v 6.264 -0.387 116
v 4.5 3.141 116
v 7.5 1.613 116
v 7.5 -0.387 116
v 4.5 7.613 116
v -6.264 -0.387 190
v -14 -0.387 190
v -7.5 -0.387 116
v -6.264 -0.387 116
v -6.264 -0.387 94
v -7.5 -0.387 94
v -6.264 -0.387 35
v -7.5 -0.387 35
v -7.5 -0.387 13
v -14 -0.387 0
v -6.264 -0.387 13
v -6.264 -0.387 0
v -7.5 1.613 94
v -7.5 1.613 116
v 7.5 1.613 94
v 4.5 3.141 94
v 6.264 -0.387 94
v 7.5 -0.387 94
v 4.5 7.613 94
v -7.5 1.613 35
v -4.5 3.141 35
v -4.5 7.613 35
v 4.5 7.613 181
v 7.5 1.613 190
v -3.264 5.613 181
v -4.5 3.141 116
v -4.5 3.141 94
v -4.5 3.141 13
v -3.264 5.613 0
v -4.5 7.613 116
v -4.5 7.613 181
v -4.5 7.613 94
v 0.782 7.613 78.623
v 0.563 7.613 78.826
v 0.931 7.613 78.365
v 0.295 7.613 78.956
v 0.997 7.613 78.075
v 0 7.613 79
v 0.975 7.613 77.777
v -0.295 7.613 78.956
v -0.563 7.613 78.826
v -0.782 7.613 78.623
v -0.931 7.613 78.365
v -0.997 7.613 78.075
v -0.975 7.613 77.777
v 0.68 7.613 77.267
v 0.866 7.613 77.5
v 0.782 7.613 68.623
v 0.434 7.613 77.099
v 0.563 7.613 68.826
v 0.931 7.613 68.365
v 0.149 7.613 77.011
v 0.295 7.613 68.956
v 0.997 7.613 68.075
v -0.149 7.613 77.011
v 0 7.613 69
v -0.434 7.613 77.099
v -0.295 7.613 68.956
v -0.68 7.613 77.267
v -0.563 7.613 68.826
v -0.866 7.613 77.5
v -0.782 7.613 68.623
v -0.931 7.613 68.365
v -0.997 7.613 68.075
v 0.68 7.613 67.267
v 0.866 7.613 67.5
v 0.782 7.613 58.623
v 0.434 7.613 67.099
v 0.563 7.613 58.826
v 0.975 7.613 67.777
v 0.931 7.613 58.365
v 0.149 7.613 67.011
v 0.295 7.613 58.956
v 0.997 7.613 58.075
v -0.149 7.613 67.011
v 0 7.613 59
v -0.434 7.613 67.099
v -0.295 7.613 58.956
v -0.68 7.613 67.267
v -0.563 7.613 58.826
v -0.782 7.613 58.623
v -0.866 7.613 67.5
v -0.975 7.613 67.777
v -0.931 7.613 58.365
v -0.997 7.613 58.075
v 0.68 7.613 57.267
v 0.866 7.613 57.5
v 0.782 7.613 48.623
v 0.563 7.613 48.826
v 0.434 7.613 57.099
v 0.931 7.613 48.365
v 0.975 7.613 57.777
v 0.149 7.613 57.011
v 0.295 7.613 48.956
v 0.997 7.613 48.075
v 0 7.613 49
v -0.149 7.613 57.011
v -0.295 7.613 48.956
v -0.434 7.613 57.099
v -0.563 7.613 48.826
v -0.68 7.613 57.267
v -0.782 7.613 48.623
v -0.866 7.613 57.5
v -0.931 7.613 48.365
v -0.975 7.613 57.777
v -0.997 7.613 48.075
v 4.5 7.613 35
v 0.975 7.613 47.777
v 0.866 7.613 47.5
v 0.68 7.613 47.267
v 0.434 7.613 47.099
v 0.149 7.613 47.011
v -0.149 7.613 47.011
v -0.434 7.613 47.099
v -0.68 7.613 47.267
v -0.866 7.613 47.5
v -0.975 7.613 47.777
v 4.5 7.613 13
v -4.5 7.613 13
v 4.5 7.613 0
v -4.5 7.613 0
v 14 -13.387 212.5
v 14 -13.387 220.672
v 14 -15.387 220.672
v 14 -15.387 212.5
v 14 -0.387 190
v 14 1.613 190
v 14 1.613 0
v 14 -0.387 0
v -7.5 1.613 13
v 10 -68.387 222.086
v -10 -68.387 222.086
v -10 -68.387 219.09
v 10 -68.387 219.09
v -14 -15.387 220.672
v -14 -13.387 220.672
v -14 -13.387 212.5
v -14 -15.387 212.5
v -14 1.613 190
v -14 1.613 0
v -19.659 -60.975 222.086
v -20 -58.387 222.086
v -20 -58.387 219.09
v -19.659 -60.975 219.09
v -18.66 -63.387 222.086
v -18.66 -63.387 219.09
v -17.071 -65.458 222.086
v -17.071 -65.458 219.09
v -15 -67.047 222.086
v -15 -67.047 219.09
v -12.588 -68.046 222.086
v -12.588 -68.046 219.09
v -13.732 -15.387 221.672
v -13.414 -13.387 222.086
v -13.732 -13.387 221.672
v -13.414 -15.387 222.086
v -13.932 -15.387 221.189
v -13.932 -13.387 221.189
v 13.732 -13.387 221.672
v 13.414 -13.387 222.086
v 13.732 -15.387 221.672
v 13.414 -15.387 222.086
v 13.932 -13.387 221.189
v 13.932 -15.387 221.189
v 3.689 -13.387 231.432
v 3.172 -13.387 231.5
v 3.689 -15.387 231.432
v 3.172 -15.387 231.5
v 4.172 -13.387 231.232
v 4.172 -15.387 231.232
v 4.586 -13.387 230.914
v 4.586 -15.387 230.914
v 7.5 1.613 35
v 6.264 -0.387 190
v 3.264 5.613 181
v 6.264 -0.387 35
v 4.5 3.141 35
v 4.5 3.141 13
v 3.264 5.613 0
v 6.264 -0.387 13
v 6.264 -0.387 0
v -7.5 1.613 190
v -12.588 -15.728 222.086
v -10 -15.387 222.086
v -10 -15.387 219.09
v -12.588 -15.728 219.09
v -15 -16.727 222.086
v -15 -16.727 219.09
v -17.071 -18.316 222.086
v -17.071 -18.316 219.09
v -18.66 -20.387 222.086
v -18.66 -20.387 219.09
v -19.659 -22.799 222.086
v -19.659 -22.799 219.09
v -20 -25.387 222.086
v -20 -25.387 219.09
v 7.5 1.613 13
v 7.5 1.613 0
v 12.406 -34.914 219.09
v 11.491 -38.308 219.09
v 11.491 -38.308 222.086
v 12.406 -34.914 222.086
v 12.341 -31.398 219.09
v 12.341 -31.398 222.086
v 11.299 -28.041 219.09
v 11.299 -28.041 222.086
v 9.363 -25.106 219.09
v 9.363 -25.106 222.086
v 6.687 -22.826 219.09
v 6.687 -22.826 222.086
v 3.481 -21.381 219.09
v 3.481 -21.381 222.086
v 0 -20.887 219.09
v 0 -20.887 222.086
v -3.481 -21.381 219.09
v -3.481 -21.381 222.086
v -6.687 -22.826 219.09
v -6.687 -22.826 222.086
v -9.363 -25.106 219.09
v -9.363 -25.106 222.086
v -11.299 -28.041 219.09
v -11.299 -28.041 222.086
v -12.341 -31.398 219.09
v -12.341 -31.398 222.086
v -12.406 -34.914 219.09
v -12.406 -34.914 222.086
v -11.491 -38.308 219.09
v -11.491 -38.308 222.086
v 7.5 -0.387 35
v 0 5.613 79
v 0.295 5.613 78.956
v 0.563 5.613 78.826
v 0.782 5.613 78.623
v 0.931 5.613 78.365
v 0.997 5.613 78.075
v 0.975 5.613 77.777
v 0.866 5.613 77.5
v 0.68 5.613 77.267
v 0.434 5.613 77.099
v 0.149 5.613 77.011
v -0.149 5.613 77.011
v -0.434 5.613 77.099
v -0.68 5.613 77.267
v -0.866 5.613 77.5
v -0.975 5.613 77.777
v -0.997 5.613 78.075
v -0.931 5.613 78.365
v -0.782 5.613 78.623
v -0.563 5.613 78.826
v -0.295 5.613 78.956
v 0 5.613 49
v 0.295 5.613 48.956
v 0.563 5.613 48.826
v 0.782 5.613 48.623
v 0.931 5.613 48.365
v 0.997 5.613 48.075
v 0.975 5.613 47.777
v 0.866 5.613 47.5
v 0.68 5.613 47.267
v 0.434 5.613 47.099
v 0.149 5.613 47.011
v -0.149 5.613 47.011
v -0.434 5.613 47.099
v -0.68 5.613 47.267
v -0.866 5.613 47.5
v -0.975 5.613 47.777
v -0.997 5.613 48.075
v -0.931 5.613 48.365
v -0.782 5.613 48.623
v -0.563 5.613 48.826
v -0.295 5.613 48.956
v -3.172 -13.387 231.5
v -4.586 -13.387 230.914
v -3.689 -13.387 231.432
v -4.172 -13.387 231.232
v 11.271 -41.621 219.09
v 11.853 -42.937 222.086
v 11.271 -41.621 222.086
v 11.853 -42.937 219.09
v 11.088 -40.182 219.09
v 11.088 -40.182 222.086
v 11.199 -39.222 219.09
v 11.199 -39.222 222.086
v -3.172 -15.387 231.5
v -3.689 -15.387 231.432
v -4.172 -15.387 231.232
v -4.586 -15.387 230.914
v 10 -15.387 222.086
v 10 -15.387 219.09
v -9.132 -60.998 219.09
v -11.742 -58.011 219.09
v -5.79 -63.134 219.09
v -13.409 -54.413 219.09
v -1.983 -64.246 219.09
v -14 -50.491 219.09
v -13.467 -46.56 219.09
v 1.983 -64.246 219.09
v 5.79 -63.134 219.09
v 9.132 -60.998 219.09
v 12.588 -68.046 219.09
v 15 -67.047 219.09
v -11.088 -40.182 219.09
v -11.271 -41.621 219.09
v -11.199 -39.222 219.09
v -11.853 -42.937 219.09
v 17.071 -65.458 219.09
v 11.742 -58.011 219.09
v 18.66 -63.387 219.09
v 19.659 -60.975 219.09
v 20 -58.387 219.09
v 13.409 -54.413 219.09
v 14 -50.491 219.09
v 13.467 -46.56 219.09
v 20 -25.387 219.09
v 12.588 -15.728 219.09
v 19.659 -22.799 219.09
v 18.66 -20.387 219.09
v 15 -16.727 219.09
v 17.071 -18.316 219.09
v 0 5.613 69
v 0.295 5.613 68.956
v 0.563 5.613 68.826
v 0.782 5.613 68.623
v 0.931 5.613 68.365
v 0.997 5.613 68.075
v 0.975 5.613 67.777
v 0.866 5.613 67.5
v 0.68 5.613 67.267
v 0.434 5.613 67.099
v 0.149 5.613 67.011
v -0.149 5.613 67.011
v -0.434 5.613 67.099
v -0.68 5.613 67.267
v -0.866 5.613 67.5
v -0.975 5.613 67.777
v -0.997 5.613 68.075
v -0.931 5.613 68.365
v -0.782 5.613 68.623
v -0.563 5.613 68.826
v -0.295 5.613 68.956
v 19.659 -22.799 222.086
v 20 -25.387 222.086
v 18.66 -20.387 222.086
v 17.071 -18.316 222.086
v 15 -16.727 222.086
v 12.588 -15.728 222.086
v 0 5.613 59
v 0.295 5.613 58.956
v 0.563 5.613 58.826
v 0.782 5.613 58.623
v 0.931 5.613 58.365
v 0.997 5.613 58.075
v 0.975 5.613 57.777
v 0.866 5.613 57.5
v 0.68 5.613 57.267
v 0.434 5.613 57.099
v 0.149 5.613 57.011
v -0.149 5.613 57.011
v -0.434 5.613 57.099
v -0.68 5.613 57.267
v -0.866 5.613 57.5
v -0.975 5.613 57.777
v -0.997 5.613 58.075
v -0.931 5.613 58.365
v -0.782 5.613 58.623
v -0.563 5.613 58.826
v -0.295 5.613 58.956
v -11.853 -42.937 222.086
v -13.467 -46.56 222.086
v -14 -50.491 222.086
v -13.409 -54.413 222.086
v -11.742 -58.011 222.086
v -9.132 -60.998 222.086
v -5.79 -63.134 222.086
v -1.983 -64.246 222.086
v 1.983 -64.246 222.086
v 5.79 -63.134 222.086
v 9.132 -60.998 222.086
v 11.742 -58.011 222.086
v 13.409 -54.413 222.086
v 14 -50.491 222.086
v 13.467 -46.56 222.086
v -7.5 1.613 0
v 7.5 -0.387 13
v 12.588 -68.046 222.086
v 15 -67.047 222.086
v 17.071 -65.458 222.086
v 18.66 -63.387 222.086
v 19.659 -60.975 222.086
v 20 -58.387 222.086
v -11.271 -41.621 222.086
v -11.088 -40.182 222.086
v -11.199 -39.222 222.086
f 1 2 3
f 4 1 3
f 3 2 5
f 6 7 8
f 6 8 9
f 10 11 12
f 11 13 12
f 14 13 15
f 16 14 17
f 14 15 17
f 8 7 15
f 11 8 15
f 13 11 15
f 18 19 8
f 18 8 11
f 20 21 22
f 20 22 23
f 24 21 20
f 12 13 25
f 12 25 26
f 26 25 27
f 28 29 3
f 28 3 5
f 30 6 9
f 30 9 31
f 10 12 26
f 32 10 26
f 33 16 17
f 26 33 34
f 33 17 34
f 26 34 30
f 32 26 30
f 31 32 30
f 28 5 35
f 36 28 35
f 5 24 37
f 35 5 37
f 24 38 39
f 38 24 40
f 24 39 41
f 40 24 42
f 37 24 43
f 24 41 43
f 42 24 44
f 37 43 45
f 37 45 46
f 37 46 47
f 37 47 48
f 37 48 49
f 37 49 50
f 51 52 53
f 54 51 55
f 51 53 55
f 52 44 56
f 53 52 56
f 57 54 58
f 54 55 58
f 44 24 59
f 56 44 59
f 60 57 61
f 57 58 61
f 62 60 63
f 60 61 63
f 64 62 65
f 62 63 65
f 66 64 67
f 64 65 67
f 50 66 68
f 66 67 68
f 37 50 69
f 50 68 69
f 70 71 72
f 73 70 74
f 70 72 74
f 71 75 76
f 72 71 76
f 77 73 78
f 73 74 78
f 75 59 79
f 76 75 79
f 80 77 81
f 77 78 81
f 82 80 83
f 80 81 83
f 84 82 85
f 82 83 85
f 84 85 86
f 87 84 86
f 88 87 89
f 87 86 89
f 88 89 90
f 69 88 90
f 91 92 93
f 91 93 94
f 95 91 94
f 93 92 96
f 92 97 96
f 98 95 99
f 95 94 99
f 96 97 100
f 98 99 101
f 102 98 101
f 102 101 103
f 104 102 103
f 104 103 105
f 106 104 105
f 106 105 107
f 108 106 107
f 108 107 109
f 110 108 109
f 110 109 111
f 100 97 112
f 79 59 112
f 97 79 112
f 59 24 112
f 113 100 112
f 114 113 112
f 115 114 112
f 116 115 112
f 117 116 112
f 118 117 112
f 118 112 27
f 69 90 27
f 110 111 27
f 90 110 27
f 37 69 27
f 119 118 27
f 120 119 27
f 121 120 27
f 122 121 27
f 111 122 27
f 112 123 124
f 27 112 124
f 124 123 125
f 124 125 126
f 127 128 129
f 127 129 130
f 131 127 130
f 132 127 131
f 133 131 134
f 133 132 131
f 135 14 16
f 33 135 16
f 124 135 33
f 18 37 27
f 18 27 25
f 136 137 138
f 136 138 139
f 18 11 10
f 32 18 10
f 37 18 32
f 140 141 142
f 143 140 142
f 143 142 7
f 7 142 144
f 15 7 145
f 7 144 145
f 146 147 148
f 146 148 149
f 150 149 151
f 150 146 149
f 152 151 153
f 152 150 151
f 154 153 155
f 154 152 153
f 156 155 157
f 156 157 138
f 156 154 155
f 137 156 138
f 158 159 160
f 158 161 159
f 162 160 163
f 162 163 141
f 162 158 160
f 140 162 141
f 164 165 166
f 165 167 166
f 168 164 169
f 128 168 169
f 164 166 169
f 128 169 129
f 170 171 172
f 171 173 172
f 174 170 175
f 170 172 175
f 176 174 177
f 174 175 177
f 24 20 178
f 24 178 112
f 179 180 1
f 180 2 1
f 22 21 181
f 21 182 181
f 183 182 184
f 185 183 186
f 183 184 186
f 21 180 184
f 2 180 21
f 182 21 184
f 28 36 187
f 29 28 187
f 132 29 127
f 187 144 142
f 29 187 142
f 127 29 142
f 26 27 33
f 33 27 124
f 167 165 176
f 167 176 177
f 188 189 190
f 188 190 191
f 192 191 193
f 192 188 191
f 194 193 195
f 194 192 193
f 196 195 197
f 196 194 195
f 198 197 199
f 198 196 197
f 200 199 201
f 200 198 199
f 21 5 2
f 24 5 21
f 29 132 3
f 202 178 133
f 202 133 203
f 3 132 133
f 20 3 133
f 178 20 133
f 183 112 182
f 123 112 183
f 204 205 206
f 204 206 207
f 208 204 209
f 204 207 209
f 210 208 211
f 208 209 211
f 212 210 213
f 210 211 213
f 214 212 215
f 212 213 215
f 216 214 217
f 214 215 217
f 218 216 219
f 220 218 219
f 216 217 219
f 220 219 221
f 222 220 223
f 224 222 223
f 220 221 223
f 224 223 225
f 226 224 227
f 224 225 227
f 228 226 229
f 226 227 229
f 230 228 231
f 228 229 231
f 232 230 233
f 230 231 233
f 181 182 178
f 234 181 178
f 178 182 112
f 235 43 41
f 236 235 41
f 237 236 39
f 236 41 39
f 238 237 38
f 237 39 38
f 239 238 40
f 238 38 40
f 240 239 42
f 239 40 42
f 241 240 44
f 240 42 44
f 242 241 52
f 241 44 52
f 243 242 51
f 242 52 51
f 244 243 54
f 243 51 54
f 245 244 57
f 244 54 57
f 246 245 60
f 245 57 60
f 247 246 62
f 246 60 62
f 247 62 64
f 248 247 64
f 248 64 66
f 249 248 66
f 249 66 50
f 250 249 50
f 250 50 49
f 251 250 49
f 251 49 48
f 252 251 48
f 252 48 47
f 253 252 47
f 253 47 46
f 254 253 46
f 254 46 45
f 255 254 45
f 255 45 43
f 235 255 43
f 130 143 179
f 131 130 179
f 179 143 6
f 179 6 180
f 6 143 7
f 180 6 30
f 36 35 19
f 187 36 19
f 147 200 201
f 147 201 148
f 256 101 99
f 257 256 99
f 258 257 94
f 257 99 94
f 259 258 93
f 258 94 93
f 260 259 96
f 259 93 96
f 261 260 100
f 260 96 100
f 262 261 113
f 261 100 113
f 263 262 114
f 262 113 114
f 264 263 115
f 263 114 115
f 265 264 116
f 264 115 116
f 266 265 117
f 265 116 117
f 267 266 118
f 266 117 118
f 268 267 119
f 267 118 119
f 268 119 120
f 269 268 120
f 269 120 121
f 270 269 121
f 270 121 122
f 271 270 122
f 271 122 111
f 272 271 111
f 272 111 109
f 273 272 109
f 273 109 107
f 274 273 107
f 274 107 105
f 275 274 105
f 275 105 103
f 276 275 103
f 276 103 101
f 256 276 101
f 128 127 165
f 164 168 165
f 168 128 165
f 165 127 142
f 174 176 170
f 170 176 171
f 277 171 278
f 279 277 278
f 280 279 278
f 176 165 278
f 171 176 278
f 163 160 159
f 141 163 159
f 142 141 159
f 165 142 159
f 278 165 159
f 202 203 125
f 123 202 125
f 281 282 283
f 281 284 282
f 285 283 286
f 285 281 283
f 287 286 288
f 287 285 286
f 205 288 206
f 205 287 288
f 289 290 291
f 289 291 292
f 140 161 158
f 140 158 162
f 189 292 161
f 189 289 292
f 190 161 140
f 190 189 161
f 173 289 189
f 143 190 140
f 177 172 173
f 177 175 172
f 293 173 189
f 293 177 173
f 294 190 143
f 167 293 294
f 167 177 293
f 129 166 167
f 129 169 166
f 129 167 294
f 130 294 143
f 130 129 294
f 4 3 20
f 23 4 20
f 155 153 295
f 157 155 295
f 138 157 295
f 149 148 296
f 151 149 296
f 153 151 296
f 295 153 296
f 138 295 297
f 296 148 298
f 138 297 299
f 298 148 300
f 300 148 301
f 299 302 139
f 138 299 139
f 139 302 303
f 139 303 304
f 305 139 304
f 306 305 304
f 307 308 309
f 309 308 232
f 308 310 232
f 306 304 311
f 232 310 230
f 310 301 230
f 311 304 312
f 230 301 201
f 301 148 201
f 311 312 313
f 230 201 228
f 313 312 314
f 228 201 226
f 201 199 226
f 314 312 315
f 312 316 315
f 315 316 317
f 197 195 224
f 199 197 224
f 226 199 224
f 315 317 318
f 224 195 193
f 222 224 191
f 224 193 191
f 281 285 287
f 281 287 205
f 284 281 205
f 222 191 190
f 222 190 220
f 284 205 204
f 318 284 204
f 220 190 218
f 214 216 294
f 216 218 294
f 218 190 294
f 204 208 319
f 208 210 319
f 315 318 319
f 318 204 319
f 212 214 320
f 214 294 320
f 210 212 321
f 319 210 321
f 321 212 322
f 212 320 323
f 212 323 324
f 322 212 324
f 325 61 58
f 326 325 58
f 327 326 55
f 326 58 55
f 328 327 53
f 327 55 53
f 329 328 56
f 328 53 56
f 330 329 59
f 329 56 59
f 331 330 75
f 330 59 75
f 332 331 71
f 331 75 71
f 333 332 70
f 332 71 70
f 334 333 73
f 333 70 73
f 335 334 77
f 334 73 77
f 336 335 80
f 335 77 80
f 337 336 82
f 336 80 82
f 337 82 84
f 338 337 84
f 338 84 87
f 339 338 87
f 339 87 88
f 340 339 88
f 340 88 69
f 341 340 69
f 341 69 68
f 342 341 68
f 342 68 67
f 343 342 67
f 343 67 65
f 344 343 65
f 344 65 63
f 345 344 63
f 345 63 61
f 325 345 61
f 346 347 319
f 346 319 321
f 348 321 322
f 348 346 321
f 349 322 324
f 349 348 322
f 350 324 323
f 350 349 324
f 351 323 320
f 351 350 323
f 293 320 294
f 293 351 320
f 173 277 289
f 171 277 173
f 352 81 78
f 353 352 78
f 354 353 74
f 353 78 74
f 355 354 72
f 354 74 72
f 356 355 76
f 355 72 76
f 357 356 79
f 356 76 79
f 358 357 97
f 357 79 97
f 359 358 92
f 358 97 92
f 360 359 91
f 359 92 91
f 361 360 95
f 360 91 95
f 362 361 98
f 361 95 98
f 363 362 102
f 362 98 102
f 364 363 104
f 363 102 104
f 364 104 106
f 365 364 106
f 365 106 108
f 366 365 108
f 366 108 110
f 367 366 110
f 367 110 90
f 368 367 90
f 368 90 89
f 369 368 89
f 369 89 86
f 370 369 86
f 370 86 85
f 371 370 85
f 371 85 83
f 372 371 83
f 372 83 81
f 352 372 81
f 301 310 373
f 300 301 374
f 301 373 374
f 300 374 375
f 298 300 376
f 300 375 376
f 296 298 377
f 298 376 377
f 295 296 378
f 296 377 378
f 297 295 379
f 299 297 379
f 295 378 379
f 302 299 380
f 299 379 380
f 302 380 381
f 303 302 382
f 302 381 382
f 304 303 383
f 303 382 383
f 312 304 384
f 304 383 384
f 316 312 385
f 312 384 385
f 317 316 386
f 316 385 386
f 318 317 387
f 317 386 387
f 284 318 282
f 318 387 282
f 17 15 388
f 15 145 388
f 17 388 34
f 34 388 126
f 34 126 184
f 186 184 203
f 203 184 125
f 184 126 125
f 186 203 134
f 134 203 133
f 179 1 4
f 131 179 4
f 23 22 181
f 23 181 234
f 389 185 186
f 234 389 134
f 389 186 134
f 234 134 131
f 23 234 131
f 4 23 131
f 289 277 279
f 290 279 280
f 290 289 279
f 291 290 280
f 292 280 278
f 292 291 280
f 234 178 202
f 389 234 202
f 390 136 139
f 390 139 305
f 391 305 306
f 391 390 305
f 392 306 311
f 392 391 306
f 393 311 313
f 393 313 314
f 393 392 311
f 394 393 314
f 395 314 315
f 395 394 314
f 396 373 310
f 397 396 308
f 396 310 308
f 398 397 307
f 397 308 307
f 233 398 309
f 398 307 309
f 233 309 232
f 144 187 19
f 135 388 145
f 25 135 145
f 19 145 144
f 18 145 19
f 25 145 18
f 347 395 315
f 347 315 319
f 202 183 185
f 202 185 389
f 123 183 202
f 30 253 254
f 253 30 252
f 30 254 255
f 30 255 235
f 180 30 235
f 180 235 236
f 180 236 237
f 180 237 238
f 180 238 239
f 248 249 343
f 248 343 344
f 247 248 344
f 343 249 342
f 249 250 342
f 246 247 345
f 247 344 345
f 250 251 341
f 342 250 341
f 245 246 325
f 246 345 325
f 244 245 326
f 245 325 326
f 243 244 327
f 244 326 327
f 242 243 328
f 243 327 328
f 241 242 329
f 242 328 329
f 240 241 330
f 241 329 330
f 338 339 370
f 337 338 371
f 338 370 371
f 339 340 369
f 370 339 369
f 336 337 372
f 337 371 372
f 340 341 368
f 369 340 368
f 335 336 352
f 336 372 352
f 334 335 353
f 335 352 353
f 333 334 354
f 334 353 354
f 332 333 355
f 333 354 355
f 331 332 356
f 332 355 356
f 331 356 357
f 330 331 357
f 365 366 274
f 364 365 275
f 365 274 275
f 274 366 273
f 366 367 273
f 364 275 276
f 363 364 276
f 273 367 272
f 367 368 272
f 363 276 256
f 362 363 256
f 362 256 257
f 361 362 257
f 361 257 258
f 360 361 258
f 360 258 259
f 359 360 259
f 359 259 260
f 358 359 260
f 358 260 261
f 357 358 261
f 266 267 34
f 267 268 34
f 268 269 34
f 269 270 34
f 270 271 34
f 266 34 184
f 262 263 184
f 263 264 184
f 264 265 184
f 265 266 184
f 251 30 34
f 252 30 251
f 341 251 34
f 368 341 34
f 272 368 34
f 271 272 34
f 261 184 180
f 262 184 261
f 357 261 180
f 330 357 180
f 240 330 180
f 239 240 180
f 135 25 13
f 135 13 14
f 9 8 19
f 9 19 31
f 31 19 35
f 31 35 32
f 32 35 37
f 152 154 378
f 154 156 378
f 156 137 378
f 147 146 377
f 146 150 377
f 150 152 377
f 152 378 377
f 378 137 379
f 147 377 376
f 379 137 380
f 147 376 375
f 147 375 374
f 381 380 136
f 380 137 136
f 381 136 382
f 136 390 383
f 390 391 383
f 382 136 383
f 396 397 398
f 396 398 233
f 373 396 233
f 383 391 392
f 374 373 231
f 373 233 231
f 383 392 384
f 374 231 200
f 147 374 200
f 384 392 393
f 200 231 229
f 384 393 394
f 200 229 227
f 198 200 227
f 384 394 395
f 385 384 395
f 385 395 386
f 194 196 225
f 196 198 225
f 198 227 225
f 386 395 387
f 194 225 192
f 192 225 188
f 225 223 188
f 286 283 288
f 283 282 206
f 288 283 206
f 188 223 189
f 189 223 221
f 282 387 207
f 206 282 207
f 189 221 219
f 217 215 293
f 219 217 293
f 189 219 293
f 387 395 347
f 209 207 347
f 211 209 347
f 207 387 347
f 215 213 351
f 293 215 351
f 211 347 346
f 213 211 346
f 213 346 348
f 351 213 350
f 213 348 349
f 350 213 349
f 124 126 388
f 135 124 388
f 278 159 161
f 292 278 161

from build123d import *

# Parameters (mm, degrees)
BOSS_EXTRUDE1_DEPTH      = 190
SKETCH3_R                = 1
CUT_EXTRUDE1_DEPTH       = 191.682982985
SKETCH4_W                = 3.000241119
SKETCH4_H                = 22
CUT_EXTRUDE2_DEPTH       = 191.682982985
BOSS_EXTRUDE2_DEPTH      = 14
BOSS_EXTRUDE2_DEPTH_BACK = 14
CHAMFER1_SIZE            = 10
FILLET1_R                = 2
BOSS_EXTRUDE3_DEPTH      = 12.41
SKETCH8_W                = 9.414213562
SKETCH8_H                = 53
CUT_EXTRUDE3_DEPTH       = 245.681494555
CUT_EXTRUDE4_DEPTH       = 244.772504146
CUT_EXTRUDE5_DEPTH       = 243.216914722
FILLET2_R                = 5


with BuildPart() as part:
    # Sketch2 → Boss-Extrude1 (new body)
    with BuildSketch(Plane.XY):
        Polygon((-14, -0.387014685), (-6.26397645, -0.387014685), (-3.263735331, 5.612985315), (3.263735331, 5.612985315), (6.26397645, -0.387014685), (14, -0.387014685), (14, 1.612985315), (7.5, 1.612985315), (4.499758881, 7.612985315), (-4.499758881, 7.612985315), (-7.5, 1.612985315), (-14, 1.612985315), align=None)
    extrude(amount=BOSS_EXTRUDE1_DEPTH)

    # Sketch3 → Cut-Extrude1 (cut, through all)
    with BuildSketch(Plane(origin=(0, 7.612985315, 0), x_dir=(1, 0, 0), z_dir=(0, 1, 0))):
        with Locations(Location((0, -48, 0), (0, 0, 270))):
            Circle(SKETCH3_R)
        with Locations(Location((0, -58, 0), (0, 0, 270))):
            Circle(SKETCH3_R)
        with Locations(Location((0, -68, 0), (0, 0, 270))):
            Circle(SKETCH3_R)
        with Locations(Location((0, -78, 0), (0, 0, 270))):
            Circle(SKETCH3_R)
    extrude(amount=-CUT_EXTRUDE1_DEPTH, mode=Mode.SUBTRACT)

    # Sketch4 → Cut-Extrude2 (cut, through all)
    with BuildSketch(Plane(origin=(0, 7.612985315, 0), x_dir=(1, 0, 0), z_dir=(0, 1, 0))):
        with Locations((-5.999879441, -24)):
            Rectangle(SKETCH4_W, SKETCH4_H)
        with Locations((-5.999879441, -105)):
            Rectangle(SKETCH4_W, SKETCH4_H)
        with Locations((5.999879441, -105)):
            Rectangle(SKETCH4_W, SKETCH4_H)
        with Locations((5.999879441, -24)):
            Rectangle(SKETCH4_W, SKETCH4_H)
    extrude(amount=-CUT_EXTRUDE2_DEPTH, mode=Mode.SUBTRACT)

    # Sketch5 → Boss-Extrude2 (add, two sides: drawn at the far end of the back side and taken through both)
    with BuildSketch(Plane(origin=(0, 0, 0), x_dir=(0, 0, -1), z_dir=(1, 0, 0)).offset(-BOSS_EXTRUDE2_DEPTH_BACK)):
        Polygon((-231.5, -15.387014685), (-212.5, -15.387014685), (-190, -0.387014685), (-178, 7.612985315), (-181, 7.612985315), (-190, 1.612985315), (-212.5, -13.387014685), (-231.5, -13.387014685), align=None)
    extrude(amount=BOSS_EXTRUDE2_DEPTH + BOSS_EXTRUDE2_DEPTH_BACK)

    # Chamfer1
    chamfer1_edges = [part.edges().sort_by_distance(p)[0] for p in [
        (14, -14.387014685, 231.5),
        (-14, -14.387014685, 231.5),
    ]]
    chamfer(chamfer1_edges, length=CHAMFER1_SIZE)

    # Fillet1
    fillet1_edges = [part.edges().sort_by_distance(p)[0] for p in [
        (4, -14.387014685, 231.5),
        (-4, -14.387014685, 231.5),
        (-14, -14.387014685, 221.5),
        (14, -14.387014685, 221.5),
    ]]
    fillet(fillet1_edges, radius=FILLET1_R)

    # Sketch7 → Boss-Extrude3 (add)
    with BuildSketch(Plane.XY.offset(231.5)):
        with BuildLine():
            Line((-10, -68.387014685), (10, -68.387014685))
            ThreePointArc((10, -68.387014685), (17.071067812, -65.458082497), (20, -58.387014685))
            Line((20, -58.387014685), (20, -25.387014685))
            ThreePointArc((20, -25.387014685), (17.071067812, -18.315946873), (10, -15.387014685))
            Line((10, -15.387014685), (-10, -15.387014685))
            ThreePointArc((-10, -15.387014685), (-17.071067812, -18.315946873), (-20, -25.387014685))
            Line((-20, -25.387014685), (-20, -58.387014685))
            ThreePointArc((-20, -58.387014685), (-17.071067812, -65.458082497), (-10, -68.387014685))
        make_face()
        with BuildLine():
            ThreePointArc((10.124631545, -40.717897038), (0, -20.887014685), (-10.124631545, -40.717897038))
            ThreePointArc((-10.124631545, -40.717897038), (0, -64.387014685), (10.124631545, -40.717897038))
        make_face(mode=Mode.SUBTRACT)
    extrude(amount=-BOSS_EXTRUDE3_DEPTH)

    # Sketch8 → Cut-Extrude3 (cut, through all)
    with BuildSketch(Plane(origin=(20, 0, 0), x_dir=(0, 0, -1), z_dir=(1, 0, 0))):
        with Locations((-226.792893219, -41.887014685)):
            Rectangle(SKETCH8_W, SKETCH8_H)
    extrude(amount=-CUT_EXTRUDE3_DEPTH, mode=Mode.SUBTRACT)

    # Sketch9 → Cut-Extrude4 (cut, through all)
    with BuildSketch(Plane(origin=(14, 0, 0), x_dir=(0, 0, -1), z_dir=(1, 0, 0))):
        Polygon((-190, 1.612985315), (-190, 7.612985315), (-181, 7.612985315), align=None)
    extrude(amount=-CUT_EXTRUDE4_DEPTH, mode=Mode.SUBTRACT)

    # Sketch11 → Cut-Extrude5 (cut, through all)
    with BuildSketch(Plane(origin=(0, 0, 0), x_dir=(-1, 0, 0), z_dir=(0, 0, -1))):
        Polygon((14, 7.612985315), (4.499758881, 7.612985315), (7.5, 1.612985315), (14, 1.612985315), align=None)
        Polygon((-14, 1.612985315), (-7.5, 1.612985315), (-4.499758881, 7.612985315), (-14, 7.612985315), align=None)
    extrude(amount=-CUT_EXTRUDE5_DEPTH, mode=Mode.SUBTRACT)

    # Fillet2
    fillet2_edges = [part.edges().sort_by_distance(p)[0] for p in [
        (-10.124631545, -40.717897038, 220.587893219),
        (10.124631545, -40.717897038, 220.587893219),
    ]]
    fillet(fillet2_edges, radius=FILLET2_R)


solid = part.part
